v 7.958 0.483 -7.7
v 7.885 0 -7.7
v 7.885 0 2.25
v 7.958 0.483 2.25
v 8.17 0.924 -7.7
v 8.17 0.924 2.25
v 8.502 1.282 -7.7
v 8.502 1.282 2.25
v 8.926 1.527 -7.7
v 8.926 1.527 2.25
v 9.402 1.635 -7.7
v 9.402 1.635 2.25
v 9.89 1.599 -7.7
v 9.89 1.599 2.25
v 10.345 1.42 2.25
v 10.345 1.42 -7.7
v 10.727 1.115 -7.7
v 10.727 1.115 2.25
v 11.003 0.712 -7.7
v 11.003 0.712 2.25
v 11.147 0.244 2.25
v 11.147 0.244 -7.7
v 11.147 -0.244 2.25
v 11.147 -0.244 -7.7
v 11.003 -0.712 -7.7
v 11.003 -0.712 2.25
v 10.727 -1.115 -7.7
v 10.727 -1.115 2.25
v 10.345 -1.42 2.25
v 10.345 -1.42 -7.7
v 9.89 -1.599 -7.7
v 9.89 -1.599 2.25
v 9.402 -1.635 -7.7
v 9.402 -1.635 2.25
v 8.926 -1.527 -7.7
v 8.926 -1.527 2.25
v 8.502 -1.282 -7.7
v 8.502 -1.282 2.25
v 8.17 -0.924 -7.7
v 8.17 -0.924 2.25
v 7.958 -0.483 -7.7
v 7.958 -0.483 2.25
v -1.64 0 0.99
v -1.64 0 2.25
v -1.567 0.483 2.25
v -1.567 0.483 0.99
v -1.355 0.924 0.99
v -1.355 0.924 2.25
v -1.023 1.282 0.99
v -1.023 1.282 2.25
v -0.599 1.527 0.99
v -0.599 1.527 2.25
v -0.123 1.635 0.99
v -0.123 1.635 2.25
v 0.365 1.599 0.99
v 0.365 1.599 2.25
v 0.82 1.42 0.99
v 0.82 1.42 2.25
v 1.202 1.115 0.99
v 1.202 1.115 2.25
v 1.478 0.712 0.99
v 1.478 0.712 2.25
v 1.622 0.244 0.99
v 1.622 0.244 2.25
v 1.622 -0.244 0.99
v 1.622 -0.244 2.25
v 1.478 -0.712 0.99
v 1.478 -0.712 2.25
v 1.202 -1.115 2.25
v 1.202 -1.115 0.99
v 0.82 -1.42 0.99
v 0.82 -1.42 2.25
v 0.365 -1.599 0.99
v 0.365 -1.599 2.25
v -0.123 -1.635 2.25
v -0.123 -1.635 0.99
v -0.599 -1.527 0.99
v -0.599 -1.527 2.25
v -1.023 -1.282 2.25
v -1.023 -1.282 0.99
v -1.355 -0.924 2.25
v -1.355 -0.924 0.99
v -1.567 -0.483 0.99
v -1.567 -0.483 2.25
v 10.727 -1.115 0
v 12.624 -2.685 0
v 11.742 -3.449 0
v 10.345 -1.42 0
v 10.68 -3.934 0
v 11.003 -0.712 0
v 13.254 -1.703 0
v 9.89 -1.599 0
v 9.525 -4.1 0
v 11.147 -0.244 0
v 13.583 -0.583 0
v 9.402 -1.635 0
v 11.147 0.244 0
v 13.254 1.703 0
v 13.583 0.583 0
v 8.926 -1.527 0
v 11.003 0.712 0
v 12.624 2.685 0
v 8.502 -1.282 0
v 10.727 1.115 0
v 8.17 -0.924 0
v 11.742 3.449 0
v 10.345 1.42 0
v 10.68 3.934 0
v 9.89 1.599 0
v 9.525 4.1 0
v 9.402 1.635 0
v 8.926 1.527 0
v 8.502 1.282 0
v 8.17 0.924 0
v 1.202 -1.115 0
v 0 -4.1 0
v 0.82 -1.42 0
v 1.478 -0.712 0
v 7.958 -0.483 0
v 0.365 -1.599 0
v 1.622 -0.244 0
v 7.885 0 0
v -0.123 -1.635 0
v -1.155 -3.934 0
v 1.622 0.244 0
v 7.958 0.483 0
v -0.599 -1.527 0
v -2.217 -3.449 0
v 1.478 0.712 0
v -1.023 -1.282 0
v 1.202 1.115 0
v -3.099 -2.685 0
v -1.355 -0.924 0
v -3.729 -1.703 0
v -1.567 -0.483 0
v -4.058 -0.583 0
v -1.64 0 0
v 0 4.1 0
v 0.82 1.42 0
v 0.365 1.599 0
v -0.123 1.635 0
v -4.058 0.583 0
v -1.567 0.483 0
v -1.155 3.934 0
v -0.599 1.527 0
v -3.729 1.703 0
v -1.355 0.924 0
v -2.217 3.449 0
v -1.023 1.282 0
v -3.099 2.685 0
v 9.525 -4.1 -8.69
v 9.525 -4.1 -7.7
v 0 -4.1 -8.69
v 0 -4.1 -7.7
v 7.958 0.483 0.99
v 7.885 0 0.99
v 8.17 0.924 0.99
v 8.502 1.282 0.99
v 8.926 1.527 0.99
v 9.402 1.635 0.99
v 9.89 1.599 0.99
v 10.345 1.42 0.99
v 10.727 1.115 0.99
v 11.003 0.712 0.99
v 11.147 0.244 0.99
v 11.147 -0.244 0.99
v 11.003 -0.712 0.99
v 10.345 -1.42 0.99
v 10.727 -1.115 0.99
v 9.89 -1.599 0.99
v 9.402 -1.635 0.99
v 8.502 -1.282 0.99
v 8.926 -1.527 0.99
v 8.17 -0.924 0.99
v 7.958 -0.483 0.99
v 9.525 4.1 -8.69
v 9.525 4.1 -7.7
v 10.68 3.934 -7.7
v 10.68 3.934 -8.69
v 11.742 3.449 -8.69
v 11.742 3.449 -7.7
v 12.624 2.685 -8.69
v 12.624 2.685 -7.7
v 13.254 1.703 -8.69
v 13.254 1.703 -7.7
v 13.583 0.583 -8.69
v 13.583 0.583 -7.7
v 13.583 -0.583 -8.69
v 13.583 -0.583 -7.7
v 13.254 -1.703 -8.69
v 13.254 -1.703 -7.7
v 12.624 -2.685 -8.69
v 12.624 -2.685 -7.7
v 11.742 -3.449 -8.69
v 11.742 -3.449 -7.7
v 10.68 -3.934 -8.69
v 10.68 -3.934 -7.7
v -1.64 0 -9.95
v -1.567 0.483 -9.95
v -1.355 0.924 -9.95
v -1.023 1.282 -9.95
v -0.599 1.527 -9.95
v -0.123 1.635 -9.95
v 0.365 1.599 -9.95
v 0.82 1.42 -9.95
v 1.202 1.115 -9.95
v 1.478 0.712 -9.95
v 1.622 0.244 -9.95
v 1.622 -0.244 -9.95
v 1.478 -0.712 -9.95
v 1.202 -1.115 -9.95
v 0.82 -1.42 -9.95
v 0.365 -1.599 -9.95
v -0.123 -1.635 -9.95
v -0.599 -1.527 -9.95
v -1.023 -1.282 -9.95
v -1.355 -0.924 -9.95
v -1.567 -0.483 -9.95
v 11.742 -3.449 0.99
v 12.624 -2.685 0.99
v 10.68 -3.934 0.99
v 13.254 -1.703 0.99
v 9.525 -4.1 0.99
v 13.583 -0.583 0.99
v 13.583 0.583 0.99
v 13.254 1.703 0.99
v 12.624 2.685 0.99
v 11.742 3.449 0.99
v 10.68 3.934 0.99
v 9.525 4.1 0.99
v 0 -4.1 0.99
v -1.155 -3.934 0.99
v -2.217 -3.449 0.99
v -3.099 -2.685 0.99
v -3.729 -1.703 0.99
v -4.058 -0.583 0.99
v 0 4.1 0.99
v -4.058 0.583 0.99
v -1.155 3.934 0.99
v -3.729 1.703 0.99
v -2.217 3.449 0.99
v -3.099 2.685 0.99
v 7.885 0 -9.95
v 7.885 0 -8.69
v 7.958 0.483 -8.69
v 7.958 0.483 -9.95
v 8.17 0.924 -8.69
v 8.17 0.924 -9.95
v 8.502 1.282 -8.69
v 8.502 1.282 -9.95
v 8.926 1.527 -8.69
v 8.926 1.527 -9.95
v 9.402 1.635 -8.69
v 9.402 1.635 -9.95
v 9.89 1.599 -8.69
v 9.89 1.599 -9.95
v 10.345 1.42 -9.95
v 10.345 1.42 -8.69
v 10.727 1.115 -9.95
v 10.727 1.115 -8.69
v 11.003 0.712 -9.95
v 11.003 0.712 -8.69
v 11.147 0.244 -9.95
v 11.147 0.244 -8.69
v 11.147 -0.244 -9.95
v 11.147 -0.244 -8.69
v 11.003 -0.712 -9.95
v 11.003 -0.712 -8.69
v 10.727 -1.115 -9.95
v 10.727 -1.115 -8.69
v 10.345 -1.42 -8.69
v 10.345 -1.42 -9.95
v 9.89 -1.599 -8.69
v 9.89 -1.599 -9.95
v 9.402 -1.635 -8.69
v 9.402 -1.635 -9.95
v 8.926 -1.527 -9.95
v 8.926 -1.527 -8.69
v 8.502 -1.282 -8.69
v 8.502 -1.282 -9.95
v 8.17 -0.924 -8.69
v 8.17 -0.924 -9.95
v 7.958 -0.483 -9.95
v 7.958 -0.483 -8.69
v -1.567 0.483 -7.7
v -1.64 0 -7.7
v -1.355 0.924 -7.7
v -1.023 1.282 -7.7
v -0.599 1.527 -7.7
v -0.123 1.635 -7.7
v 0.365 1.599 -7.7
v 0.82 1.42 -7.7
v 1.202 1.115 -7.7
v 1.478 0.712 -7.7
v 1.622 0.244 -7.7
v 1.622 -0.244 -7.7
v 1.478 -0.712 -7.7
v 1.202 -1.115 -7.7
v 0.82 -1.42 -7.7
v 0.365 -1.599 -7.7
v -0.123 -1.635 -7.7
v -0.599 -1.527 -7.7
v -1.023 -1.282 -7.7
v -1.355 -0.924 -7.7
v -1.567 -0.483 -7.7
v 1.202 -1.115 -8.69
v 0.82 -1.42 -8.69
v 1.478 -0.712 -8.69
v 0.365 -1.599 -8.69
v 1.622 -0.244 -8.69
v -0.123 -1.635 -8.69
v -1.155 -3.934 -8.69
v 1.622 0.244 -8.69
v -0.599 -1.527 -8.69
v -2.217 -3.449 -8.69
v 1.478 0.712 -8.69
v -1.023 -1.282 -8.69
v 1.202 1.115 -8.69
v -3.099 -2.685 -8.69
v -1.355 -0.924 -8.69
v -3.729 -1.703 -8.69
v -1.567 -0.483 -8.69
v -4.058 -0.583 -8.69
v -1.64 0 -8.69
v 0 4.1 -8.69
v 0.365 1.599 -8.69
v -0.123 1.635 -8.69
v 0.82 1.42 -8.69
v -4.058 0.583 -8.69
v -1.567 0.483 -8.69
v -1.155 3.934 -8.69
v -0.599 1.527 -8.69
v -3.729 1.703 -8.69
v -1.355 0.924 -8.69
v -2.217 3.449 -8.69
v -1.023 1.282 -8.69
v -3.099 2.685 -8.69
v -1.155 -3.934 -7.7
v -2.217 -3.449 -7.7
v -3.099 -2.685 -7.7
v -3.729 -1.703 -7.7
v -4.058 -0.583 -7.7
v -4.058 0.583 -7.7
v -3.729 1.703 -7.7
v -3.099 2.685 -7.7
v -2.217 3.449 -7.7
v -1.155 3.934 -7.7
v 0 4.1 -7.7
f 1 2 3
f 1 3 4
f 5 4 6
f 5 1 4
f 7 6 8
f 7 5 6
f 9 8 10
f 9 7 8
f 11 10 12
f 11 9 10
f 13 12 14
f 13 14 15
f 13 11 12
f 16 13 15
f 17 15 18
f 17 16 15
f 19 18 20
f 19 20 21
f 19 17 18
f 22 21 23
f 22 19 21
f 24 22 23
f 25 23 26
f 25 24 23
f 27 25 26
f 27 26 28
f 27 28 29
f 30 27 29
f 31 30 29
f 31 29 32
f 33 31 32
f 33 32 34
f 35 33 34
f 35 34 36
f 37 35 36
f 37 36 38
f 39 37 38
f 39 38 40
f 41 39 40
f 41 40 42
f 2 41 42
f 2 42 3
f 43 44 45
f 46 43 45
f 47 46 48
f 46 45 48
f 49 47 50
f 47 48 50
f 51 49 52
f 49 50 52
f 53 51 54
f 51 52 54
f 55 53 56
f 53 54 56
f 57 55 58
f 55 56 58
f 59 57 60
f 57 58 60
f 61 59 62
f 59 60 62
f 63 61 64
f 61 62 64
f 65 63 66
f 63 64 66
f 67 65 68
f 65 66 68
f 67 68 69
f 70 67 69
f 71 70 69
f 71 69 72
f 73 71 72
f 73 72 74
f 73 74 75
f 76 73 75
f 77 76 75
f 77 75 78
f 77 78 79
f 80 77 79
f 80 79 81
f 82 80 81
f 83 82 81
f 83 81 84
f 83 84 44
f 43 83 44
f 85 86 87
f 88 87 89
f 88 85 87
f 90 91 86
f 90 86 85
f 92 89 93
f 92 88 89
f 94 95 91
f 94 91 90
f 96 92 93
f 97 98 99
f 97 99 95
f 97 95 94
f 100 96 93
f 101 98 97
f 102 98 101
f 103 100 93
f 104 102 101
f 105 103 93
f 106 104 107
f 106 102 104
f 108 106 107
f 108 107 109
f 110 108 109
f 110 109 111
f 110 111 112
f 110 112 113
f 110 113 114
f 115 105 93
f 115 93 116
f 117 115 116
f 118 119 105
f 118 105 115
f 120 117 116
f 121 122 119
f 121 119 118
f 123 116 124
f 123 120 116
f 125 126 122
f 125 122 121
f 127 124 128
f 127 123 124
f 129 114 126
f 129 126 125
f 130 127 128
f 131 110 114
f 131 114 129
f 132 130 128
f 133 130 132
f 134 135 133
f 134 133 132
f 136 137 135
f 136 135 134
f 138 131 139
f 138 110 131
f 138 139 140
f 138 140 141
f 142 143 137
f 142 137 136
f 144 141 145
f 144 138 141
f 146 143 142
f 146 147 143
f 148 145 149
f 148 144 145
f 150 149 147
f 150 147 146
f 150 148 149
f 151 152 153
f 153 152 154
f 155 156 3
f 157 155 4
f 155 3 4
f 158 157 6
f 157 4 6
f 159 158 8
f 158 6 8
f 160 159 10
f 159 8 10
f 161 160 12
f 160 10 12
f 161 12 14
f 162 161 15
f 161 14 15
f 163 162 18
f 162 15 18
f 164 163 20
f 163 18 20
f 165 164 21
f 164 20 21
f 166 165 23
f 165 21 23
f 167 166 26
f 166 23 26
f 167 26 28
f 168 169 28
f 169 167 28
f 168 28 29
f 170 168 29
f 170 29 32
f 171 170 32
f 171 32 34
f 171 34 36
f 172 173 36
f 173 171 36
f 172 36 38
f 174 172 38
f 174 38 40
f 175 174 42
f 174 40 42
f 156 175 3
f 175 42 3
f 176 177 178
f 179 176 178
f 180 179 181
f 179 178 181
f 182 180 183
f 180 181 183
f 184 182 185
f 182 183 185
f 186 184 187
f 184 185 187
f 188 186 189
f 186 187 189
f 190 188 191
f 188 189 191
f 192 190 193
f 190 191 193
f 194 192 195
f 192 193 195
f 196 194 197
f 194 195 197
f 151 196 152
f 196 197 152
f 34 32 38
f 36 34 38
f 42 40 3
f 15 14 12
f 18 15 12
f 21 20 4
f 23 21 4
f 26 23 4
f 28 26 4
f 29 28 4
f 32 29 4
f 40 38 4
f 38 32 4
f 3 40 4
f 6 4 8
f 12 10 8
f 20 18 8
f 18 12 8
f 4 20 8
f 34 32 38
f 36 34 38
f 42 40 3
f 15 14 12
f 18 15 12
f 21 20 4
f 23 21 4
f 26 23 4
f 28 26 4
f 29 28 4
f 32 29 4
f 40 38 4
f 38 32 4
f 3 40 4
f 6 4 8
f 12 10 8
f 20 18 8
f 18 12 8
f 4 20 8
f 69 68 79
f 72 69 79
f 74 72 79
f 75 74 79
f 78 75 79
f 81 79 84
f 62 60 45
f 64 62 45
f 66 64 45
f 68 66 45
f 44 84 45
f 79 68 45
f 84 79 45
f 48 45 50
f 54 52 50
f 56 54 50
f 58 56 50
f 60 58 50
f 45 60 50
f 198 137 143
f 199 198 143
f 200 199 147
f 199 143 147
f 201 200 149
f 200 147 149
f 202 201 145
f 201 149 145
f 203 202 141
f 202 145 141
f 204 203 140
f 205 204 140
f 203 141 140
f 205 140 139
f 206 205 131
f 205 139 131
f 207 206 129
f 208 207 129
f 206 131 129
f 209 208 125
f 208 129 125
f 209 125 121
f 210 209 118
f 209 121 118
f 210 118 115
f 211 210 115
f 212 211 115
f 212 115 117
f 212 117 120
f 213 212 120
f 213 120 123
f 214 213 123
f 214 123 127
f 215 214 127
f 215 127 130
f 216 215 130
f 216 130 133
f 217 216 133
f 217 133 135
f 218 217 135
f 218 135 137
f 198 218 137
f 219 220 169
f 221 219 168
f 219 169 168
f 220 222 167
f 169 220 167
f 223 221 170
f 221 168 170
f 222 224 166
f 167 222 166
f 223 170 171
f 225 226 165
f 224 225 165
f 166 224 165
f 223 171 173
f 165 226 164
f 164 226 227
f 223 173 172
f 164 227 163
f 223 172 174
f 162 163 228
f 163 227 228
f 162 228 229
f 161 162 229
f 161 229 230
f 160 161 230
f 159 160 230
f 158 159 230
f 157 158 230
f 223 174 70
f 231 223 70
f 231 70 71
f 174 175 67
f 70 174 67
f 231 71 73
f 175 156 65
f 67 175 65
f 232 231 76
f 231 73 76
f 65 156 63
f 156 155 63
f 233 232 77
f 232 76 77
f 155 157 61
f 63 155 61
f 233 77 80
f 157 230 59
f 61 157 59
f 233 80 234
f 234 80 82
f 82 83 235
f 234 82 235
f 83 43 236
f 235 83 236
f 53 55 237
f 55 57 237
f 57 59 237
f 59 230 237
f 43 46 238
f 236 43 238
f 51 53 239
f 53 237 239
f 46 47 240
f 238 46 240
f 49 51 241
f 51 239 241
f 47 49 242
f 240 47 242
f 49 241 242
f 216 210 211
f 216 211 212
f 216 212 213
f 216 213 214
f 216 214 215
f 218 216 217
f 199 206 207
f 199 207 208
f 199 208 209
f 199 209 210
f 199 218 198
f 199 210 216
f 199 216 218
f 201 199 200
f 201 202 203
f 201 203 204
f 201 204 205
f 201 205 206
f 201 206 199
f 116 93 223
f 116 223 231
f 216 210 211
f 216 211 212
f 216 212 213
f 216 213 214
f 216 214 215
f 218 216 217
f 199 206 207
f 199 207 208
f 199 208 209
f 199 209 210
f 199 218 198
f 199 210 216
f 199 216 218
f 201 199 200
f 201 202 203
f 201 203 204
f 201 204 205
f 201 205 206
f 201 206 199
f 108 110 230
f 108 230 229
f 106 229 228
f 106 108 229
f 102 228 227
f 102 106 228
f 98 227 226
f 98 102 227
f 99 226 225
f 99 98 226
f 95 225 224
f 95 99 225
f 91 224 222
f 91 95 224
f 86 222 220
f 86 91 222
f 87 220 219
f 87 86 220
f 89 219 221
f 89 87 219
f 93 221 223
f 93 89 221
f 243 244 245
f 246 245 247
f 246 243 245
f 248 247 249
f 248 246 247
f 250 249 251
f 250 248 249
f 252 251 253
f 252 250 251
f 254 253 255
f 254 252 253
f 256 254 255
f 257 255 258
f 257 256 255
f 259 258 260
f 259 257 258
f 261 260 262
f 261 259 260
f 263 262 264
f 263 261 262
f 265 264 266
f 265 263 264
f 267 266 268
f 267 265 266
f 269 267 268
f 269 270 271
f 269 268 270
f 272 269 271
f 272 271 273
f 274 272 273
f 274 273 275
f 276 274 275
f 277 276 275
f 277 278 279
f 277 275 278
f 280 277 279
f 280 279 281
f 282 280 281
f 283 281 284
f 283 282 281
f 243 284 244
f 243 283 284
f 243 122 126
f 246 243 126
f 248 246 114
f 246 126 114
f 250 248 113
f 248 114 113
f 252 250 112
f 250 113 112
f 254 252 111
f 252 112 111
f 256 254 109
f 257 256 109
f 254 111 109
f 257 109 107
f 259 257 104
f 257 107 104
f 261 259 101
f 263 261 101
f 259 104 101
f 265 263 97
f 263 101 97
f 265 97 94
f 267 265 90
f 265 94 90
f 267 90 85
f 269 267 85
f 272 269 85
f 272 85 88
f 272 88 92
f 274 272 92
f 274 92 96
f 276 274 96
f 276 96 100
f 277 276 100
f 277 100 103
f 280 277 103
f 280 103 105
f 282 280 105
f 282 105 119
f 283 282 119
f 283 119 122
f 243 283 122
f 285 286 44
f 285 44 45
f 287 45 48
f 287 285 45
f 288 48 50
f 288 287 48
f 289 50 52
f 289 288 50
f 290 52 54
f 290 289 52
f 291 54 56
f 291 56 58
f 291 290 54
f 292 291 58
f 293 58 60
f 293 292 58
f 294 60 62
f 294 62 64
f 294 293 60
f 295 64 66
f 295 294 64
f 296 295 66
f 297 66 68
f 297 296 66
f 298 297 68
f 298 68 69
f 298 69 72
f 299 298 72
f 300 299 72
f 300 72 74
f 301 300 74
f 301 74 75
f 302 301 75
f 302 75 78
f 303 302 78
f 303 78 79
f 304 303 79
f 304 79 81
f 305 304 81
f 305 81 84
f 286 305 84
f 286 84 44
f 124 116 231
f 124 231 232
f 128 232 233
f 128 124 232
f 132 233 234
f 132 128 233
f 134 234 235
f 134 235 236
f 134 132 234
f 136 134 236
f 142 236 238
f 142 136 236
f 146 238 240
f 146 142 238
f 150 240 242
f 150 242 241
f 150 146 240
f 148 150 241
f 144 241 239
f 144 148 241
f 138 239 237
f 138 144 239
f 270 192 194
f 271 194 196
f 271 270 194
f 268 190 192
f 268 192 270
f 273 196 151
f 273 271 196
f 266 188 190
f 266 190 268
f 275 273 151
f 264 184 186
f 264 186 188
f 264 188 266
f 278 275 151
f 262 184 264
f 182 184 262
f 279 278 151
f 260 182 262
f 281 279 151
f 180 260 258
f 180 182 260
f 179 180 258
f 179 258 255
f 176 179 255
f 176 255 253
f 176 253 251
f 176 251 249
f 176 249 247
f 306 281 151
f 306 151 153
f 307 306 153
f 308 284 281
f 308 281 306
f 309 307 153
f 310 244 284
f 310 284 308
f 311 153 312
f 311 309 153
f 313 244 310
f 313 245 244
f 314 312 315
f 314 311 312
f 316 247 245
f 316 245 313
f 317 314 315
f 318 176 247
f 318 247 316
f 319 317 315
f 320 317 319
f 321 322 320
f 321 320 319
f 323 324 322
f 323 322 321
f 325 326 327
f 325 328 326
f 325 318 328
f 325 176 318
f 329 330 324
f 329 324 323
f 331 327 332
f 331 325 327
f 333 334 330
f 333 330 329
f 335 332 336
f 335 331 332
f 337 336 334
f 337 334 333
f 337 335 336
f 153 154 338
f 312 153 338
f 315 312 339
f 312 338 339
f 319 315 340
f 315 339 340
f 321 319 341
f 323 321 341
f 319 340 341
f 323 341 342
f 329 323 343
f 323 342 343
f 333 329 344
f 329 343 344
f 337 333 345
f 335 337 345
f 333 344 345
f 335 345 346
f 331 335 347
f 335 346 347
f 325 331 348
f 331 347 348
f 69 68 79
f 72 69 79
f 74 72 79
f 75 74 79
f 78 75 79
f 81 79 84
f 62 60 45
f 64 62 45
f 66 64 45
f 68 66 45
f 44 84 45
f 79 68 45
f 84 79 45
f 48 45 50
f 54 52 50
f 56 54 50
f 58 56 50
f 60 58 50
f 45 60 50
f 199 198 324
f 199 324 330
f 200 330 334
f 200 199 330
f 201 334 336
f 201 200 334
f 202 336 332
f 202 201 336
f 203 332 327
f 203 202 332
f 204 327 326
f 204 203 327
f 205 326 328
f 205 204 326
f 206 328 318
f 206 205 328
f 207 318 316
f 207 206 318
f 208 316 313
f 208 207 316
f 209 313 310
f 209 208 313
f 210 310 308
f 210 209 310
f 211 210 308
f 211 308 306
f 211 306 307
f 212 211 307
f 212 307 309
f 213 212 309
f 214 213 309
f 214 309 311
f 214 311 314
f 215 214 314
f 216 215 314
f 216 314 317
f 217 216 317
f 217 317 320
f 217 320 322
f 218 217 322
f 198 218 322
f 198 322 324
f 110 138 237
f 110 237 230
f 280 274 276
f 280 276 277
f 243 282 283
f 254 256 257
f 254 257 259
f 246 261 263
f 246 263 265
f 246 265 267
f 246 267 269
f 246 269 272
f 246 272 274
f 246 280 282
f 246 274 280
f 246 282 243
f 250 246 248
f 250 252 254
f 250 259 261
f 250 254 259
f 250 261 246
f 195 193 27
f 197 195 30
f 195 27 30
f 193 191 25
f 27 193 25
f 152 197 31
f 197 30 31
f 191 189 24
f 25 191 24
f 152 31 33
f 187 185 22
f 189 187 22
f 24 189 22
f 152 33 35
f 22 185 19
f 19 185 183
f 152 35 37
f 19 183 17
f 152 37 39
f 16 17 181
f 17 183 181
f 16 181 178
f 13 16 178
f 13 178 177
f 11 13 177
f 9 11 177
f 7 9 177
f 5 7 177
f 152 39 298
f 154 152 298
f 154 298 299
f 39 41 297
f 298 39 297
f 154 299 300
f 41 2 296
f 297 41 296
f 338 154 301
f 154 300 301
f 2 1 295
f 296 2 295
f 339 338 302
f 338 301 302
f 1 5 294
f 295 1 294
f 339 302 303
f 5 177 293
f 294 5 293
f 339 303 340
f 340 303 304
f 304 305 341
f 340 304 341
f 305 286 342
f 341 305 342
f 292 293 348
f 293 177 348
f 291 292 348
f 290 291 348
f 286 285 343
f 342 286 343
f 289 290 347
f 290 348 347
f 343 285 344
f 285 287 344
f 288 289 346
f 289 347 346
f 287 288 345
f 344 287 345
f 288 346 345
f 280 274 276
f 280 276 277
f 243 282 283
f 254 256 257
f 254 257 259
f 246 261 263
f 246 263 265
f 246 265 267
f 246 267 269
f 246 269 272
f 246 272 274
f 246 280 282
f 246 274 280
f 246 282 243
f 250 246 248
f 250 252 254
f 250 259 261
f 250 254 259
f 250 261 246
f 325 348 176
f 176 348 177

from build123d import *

# Parameters (mm, degrees)
SKETCH1_R                = 1.64
BOSS_EXTRUDE1_DEPTH      = 0.99
BOSS_EXTRUDE2_DEPTH      = 9.95
BOSS_EXTRUDE2_DEPTH_BACK = 2.25
SKETCH2_R                = 1.64


with BuildPart() as part:
    # Sketch1 → Boss-Extrude1 (new body)
    with BuildSketch(Plane.XY):
        with BuildLine():
            Line((0, 4.1), (9.525, 4.1))
            ThreePointArc((9.525, 4.1), (13.625, 0), (9.525, -4.1))
            Line((9.525, -4.1), (0, -4.1))
            ThreePointArc((0, -4.1), (-4.1, 0), (0, 4.1))
        make_face()
        Circle(SKETCH1_R, mode=Mode.SUBTRACT)
        with Locations(Location((9.525, 0, 0), (0, 0, 180))):
            Circle(SKETCH1_R, mode=Mode.SUBTRACT)
    extrude(amount=BOSS_EXTRUDE1_DEPTH)

    # Sketch2 → Boss-Extrude2 (add, two sides: drawn at the far end of the back side and taken through both)
    with BuildSketch(Plane(origin=(0, 0, 0), x_dir=(-1, 0, 0), z_dir=(0, 0, -1)).offset(-BOSS_EXTRUDE2_DEPTH_BACK)):
        with Locations((-9.525, 0)):
            Circle(SKETCH2_R)
        Circle(SKETCH2_R)
    extrude(amount=BOSS_EXTRUDE2_DEPTH + BOSS_EXTRUDE2_DEPTH_BACK)


with BuildPart() as body_2:
    # Mirror1: mirrored copy
    add(part.part.mirror(Plane(origin=(0, 0, -3.85), x_dir=(1, 0, 0), z_dir=(0, 0, -1))))


solid = Compound([part.part, body_2.part])
